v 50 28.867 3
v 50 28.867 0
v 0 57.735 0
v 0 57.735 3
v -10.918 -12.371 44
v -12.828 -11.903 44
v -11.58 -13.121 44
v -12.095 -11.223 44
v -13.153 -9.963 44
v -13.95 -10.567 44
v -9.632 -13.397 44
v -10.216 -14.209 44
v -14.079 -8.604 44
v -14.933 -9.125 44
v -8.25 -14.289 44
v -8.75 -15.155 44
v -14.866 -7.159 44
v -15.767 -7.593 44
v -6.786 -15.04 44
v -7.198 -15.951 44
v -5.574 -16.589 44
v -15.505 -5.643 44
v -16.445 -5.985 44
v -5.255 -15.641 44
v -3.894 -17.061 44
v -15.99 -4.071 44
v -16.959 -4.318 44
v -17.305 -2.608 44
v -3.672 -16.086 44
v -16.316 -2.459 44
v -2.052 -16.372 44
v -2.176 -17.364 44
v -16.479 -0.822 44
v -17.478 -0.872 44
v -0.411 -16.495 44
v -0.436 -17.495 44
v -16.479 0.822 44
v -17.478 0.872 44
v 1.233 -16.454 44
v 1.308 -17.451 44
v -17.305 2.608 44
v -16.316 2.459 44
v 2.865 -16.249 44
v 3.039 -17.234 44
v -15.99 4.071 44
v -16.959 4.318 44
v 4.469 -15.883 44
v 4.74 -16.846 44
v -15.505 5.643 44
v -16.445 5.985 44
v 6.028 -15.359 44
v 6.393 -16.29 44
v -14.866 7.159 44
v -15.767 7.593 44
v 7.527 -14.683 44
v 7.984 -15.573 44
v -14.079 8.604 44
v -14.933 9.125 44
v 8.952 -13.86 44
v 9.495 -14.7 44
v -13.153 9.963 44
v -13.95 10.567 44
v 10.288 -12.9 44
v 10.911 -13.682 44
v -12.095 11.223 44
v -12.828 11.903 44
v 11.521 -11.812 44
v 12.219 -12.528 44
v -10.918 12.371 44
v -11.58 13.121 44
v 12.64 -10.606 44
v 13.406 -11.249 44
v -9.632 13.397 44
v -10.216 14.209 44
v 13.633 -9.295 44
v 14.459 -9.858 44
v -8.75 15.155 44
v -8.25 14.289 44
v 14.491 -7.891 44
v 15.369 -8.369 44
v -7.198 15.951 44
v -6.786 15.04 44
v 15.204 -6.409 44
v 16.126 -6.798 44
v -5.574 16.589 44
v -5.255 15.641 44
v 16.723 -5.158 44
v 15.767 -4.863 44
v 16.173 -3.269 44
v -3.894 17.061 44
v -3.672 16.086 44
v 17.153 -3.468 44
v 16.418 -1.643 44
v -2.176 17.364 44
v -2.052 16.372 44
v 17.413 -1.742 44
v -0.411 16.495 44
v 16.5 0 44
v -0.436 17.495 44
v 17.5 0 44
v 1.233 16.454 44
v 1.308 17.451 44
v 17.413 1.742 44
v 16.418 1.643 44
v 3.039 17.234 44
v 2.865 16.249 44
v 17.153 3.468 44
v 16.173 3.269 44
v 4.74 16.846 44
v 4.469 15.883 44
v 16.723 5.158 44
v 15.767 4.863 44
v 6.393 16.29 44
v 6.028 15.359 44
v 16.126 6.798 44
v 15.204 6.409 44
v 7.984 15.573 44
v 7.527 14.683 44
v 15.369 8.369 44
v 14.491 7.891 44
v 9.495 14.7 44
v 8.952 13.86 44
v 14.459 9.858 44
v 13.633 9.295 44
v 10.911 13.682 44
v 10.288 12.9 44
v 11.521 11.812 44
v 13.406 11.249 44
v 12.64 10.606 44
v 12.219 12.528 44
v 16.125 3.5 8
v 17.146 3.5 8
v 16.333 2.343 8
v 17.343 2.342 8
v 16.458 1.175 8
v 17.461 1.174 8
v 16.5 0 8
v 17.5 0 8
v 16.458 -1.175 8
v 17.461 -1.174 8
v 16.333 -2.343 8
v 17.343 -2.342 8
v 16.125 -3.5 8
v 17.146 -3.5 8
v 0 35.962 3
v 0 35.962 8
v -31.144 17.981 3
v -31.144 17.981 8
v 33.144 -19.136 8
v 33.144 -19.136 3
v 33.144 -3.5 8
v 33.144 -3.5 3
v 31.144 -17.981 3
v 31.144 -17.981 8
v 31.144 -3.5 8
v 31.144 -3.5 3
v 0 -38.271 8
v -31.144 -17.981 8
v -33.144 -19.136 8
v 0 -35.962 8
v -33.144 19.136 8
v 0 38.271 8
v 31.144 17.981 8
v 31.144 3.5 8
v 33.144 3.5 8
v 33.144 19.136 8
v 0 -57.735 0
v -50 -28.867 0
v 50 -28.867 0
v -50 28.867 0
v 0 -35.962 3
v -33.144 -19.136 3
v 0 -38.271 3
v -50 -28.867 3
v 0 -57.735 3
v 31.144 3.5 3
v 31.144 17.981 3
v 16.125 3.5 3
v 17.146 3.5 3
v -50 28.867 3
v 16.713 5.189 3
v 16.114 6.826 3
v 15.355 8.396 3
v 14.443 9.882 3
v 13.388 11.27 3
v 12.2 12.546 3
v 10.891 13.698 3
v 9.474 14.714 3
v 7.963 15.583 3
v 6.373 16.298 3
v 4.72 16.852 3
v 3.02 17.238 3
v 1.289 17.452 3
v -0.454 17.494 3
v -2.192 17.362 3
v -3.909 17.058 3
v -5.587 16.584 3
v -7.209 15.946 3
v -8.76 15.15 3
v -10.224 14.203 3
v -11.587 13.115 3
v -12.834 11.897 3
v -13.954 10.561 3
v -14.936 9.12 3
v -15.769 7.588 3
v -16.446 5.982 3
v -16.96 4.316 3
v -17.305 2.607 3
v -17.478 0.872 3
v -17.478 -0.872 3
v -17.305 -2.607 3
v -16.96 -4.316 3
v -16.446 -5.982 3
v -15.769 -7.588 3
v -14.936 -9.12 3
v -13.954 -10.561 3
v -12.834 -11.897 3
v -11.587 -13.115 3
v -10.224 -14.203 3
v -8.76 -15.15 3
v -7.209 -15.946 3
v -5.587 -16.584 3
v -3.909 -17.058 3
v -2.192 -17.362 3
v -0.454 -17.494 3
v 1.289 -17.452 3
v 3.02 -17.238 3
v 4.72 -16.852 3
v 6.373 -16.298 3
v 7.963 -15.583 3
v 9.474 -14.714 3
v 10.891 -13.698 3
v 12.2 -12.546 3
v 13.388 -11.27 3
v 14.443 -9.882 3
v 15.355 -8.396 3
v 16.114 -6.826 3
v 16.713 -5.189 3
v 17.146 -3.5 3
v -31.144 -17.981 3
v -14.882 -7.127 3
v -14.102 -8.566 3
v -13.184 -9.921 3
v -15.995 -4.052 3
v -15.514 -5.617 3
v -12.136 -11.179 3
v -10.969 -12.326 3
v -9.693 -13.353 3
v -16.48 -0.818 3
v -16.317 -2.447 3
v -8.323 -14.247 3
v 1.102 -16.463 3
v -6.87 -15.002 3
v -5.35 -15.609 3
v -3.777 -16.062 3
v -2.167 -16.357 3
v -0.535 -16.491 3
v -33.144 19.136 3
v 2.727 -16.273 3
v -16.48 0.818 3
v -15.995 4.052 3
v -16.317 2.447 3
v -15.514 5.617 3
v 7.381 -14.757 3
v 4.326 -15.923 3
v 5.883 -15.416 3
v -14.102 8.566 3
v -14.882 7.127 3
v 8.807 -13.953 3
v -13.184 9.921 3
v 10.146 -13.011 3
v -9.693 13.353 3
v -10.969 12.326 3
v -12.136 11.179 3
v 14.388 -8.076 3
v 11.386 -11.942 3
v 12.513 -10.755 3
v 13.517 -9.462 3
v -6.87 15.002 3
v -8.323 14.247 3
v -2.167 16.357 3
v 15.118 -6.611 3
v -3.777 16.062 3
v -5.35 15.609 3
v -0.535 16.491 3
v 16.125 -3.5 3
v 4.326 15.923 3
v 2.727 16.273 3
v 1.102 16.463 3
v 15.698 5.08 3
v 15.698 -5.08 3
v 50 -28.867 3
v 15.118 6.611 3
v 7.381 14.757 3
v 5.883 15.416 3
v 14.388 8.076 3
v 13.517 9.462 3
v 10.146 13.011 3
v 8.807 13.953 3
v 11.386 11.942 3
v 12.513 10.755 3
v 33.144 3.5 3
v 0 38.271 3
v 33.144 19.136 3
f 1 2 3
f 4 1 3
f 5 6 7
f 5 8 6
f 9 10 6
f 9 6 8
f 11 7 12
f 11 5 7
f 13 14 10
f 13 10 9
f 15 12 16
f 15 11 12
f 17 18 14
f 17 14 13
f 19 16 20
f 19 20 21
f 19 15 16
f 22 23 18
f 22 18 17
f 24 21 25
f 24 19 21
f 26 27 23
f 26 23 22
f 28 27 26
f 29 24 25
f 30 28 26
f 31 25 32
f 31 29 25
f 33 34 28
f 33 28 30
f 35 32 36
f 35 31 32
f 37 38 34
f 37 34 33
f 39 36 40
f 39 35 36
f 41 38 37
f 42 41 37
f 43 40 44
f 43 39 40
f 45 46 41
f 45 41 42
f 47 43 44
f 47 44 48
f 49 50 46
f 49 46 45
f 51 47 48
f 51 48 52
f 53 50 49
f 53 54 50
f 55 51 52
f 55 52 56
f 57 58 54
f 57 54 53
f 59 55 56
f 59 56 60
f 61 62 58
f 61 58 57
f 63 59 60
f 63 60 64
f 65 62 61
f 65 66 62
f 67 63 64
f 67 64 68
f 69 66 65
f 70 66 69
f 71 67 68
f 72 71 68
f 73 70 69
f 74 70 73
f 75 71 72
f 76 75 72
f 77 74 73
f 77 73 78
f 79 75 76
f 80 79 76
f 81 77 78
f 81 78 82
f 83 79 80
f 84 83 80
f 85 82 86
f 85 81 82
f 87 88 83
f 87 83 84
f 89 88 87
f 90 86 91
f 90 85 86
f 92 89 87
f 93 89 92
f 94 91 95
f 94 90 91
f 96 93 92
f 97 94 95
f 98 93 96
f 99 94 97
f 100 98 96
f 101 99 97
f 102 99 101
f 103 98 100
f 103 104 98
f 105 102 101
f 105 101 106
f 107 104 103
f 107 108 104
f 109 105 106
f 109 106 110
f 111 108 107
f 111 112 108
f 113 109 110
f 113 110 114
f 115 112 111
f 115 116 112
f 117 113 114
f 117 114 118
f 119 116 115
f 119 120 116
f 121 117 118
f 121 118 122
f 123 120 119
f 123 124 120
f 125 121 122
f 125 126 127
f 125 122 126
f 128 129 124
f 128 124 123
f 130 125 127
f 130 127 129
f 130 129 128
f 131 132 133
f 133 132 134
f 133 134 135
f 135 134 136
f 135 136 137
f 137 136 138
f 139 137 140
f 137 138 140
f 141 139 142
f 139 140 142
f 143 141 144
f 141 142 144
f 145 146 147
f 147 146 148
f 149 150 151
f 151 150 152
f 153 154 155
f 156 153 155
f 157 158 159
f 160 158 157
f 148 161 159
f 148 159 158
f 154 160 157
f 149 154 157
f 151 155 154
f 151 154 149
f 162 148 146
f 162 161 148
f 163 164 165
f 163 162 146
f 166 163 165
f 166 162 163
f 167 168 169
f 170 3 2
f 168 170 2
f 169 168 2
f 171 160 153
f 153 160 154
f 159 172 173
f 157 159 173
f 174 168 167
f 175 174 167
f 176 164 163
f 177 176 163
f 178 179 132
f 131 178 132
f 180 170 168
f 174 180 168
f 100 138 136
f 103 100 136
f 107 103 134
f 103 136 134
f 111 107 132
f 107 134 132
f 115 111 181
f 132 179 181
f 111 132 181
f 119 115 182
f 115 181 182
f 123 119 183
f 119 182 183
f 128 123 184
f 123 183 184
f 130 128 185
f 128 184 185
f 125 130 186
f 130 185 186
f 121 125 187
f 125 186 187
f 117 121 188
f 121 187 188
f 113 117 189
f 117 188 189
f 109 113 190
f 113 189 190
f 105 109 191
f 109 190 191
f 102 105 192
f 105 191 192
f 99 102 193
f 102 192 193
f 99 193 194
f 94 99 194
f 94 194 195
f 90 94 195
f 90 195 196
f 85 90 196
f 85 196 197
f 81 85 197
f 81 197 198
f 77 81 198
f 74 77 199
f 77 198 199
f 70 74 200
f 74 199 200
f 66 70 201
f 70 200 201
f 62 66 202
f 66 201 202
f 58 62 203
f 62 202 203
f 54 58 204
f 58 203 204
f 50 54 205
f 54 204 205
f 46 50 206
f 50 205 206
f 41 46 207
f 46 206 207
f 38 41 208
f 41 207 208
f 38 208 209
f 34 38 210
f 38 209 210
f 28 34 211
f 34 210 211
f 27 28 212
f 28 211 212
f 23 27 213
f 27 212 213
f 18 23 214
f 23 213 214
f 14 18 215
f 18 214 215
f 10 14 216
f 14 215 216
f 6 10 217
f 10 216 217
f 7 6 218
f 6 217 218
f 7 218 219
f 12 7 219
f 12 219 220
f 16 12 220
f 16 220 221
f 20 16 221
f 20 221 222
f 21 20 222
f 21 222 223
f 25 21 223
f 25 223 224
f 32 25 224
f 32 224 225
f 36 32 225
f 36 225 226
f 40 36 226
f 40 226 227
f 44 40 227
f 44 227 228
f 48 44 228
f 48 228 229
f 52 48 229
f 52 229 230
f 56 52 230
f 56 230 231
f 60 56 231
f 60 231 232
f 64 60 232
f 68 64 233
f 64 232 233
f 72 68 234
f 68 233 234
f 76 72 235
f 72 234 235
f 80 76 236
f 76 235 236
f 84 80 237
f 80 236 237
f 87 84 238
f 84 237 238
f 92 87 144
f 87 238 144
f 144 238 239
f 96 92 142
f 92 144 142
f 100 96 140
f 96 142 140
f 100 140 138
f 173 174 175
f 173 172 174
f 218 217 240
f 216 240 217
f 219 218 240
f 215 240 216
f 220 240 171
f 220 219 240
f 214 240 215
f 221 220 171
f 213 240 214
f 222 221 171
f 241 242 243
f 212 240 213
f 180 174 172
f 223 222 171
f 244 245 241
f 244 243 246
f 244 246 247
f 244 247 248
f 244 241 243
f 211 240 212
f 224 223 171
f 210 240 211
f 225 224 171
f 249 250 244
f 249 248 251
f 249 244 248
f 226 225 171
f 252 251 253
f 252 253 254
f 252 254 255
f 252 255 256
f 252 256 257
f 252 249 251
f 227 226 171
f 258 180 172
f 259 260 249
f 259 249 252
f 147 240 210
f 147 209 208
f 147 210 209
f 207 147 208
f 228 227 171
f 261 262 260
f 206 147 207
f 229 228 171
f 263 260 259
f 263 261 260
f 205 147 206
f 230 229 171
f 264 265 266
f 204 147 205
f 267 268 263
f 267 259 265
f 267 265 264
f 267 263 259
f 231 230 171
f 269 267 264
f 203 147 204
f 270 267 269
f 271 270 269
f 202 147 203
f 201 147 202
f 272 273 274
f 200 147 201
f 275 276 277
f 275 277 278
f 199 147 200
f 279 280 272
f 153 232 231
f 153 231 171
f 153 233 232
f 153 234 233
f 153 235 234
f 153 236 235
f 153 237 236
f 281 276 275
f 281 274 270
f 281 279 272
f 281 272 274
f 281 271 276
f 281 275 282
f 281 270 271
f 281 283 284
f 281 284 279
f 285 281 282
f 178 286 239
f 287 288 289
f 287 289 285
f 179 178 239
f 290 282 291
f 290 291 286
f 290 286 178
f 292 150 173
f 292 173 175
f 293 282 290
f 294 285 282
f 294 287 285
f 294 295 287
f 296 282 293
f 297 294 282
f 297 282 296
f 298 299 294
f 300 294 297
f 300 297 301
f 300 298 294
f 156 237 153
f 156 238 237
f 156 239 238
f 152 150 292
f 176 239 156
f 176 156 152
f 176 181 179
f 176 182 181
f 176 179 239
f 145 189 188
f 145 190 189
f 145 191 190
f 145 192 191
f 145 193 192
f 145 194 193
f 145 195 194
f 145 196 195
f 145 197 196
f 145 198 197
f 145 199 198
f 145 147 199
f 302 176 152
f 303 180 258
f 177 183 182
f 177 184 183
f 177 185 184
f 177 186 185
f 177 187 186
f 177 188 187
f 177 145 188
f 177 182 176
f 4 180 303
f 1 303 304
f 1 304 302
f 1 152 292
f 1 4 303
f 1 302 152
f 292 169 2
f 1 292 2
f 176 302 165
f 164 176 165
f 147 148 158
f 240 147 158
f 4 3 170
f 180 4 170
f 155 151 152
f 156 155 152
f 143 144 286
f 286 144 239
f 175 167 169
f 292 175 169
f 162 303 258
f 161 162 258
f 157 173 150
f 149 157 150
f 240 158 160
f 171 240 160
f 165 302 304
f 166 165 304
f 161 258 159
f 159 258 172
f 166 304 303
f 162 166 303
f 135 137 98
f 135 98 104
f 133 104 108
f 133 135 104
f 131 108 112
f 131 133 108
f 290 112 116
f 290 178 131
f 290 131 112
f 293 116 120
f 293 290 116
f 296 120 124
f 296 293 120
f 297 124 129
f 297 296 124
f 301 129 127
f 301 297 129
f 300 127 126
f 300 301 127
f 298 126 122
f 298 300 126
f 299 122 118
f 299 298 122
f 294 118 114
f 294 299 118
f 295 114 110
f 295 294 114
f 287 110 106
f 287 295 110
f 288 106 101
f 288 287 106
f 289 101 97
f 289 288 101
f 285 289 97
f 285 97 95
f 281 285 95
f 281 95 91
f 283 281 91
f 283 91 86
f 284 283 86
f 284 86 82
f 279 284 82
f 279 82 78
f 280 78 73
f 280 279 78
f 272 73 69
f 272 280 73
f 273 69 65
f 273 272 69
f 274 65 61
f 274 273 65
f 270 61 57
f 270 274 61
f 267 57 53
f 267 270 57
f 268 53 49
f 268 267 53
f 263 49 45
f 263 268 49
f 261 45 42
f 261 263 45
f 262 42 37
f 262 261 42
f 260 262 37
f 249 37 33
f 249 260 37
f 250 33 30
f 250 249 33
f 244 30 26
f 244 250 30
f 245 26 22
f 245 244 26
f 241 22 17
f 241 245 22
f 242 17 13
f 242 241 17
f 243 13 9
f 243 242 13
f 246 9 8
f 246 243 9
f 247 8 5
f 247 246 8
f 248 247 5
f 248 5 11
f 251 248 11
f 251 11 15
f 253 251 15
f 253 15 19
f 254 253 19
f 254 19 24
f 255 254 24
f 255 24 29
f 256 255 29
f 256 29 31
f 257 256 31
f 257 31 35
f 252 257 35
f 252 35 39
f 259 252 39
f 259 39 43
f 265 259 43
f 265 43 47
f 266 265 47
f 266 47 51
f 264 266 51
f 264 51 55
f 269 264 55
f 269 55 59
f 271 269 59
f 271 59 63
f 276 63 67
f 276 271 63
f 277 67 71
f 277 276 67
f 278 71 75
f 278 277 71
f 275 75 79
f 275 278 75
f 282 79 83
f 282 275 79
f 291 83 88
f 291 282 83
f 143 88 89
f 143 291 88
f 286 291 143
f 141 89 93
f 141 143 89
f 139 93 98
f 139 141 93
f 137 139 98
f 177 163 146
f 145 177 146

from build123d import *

# Parameters (mm, degrees)
F1_DEPTH = 3
F3_DEPTH = 5
F5_DEPTH = 5
F6_R     = 17.5
F6_R_2   = 16.5
F7_DEPTH = 41
F8_W     = 3.5
F8_H     = 4
F9_DEPTH = 25


with BuildPart() as f1:
    # F0 (on Top) → F1 (new body)
    with BuildSketch(Plane.XY):
        Polygon((49.999933, 28.867475), (0, 57.73495), (-49.999933, 28.867475), (-49.999933, -28.867475), (0, -57.73495), (49.999933, -28.867475), align=None)
    extrude(amount=F1_DEPTH)

    # F2 (on face) → F3 (join)
    with BuildSketch(Plane.XY.offset(3)):
        Polygon((33.143658, 19.1355), (0, 38.271), (-33.143658, 19.1355), (-33.143658, -19.1355), (0, -38.271), (33.143658, -19.1355), align=None)
    extrude(amount=F3_DEPTH)

    # F4 (on face) → F5 (cut)
    with BuildSketch(Plane.XY.offset(8)):
        Polygon((31.143884, 17.98093), (0, 35.96186), (-31.143884, 17.98093), (-31.143884, -17.98093), (0, -35.96186), (31.143884, -17.98093), align=None)
    extrude(amount=-F5_DEPTH, mode=Mode.SUBTRACT)

    # F6 (on face) → F7 (join)
    with BuildSketch(Plane.XY.offset(3)):
        Circle(F6_R)
        Circle(F6_R_2, mode=Mode.SUBTRACT)
    extrude(amount=F7_DEPTH)

    # F8 (on face) → F9 (cut)
    with BuildSketch(Plane.YZ.offset(33.143658)):
        with Locations((-1.75, 5)):
            Rectangle(F8_W, F8_H)
        with Locations((1.75, 5)):
            Rectangle(F8_W, F8_H)
        Polygon((-3.5, 7), (0, 7), (3.5, 7), (3.5, 8), (-3.5, 8), align=None)
    extrude(amount=-F9_DEPTH, mode=Mode.SUBTRACT)


solid = f1.part
